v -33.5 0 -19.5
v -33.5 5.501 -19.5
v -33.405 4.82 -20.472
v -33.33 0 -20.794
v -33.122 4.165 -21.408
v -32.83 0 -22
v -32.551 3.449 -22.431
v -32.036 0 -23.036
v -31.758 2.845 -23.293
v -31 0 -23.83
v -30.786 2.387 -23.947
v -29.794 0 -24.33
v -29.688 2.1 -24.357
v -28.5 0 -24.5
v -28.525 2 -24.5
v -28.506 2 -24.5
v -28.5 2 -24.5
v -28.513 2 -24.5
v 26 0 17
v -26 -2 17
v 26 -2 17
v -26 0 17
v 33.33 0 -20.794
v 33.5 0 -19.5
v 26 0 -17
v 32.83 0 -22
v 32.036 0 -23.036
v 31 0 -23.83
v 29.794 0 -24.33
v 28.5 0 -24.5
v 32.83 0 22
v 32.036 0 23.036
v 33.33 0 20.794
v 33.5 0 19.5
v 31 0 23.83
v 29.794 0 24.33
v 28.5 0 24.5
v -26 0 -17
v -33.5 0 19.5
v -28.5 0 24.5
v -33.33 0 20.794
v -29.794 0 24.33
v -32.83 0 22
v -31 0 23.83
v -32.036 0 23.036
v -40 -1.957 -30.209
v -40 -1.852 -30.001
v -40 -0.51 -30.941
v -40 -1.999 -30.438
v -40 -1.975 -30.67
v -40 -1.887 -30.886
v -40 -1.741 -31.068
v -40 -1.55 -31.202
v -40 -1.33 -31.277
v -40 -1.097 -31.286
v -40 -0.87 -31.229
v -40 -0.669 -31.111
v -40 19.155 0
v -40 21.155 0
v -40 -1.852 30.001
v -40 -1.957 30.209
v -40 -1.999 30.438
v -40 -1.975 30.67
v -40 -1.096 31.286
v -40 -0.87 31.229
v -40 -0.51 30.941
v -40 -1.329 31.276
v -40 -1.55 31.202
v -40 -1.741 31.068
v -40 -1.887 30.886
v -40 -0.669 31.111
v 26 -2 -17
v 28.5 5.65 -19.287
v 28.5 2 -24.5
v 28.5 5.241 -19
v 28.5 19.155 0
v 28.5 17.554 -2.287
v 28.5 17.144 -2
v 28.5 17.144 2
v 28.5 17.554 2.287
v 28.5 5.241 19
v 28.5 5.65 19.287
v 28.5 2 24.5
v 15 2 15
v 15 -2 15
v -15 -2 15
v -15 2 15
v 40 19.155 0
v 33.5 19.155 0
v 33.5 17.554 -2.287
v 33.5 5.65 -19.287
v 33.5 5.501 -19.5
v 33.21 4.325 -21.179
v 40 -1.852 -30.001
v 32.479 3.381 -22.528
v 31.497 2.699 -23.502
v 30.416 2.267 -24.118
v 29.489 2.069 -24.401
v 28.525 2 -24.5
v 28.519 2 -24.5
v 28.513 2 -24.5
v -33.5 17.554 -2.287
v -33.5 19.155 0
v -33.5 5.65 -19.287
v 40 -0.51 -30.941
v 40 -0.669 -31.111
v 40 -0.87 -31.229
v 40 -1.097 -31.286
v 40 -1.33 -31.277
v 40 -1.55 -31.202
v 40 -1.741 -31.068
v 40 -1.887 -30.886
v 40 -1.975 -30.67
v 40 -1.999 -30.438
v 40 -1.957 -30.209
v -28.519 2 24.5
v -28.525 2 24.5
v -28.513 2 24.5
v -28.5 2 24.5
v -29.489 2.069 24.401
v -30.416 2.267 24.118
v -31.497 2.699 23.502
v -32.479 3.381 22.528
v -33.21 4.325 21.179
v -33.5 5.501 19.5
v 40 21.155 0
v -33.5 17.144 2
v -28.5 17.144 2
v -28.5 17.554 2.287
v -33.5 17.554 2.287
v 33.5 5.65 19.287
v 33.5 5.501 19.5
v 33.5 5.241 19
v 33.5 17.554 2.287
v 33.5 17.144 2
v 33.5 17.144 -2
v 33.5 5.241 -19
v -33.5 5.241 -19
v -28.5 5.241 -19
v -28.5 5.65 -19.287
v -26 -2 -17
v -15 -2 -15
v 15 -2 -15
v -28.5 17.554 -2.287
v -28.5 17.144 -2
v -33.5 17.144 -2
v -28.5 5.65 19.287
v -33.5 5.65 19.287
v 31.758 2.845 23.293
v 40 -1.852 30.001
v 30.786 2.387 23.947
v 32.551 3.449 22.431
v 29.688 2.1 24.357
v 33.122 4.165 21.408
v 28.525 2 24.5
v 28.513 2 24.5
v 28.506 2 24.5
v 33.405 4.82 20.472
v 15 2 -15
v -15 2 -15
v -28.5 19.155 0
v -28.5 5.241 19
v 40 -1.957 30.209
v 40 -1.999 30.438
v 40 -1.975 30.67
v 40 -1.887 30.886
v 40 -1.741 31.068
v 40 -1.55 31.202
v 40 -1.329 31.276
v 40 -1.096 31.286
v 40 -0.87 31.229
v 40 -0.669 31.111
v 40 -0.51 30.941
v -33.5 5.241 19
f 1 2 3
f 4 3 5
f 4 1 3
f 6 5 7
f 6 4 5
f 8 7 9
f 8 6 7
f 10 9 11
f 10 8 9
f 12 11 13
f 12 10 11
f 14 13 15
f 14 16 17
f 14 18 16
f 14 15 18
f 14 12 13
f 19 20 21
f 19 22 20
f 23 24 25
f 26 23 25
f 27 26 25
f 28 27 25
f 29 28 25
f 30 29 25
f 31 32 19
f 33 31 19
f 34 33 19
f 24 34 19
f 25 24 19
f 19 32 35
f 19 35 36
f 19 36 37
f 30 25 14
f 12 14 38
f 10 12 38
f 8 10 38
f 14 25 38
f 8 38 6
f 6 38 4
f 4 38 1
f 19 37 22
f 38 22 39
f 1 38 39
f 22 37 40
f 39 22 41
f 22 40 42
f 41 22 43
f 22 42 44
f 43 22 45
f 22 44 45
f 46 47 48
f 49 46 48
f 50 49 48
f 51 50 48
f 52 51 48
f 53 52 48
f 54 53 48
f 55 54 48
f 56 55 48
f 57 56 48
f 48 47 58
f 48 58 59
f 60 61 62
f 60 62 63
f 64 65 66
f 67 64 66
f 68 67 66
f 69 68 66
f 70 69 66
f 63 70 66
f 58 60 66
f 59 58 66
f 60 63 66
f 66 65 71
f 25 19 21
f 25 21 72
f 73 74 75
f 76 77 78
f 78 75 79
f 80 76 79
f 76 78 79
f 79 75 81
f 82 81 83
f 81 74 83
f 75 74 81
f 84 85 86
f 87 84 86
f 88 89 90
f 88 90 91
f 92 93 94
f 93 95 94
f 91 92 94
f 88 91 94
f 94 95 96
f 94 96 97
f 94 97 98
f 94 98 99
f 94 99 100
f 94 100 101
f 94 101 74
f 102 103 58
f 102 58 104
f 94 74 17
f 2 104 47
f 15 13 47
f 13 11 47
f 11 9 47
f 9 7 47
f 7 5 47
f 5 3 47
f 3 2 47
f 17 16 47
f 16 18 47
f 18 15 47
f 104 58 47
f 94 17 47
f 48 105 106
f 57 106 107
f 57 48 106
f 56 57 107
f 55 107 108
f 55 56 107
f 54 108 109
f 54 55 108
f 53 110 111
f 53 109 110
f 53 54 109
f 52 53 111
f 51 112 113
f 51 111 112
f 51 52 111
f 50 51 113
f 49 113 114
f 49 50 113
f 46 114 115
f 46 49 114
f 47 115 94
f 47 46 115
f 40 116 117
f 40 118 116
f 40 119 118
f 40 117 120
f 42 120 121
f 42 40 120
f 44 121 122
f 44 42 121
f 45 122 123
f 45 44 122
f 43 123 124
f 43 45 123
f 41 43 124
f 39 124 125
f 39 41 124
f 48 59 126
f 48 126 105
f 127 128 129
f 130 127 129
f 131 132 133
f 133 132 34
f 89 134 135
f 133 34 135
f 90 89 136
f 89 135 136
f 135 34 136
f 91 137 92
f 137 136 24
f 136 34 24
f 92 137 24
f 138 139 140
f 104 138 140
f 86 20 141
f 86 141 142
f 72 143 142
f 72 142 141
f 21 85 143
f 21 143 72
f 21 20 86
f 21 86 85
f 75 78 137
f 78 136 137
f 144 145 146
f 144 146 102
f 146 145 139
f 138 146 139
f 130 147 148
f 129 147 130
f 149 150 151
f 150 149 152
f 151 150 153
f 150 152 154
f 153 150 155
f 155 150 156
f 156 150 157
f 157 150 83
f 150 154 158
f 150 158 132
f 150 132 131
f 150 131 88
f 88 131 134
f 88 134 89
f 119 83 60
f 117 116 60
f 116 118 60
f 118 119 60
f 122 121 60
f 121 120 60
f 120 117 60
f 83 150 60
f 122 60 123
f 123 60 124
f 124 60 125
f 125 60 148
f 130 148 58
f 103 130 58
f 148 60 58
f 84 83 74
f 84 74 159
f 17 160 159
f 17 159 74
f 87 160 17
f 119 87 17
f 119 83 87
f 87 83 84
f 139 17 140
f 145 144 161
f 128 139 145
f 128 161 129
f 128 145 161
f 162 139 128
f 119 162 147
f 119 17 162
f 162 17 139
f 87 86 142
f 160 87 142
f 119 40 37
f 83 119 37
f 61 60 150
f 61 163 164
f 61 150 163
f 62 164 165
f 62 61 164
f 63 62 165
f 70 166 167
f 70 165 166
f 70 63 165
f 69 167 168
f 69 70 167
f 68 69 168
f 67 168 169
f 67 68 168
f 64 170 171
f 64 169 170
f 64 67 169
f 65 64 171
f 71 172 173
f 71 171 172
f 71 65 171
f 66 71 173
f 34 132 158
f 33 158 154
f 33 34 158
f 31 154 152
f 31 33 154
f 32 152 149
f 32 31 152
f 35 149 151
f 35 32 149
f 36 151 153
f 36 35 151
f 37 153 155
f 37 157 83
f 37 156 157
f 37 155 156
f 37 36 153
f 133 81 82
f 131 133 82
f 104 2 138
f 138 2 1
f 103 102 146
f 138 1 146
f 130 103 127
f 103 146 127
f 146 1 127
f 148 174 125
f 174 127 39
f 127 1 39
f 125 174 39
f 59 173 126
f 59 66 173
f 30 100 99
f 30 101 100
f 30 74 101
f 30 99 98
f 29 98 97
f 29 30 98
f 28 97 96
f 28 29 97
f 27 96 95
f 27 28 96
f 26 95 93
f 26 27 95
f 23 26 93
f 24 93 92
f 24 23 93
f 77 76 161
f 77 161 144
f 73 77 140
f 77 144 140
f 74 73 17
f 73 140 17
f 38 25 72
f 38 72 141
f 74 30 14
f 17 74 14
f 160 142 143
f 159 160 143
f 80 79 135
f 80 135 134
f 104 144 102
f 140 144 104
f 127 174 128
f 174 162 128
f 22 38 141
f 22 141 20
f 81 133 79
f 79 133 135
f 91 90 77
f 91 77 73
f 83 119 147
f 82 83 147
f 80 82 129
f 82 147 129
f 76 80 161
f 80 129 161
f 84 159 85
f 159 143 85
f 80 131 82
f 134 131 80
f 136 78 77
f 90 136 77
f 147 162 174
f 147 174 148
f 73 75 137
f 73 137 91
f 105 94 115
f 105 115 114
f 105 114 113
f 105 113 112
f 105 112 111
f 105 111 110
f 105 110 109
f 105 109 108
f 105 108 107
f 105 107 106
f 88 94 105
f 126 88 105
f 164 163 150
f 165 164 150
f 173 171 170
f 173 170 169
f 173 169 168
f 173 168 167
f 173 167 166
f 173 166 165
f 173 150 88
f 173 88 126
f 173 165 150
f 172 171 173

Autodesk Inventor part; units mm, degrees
ref_plane "YZ Plane" through (0, 0, 0) normal (1, 0, 0) x (0, 1, 0)
ref_plane "XZ Plane" through (0, 0, 0) normal (0, 1, 0) x (-1, 0, 0)
ref_plane "XY Plane" through (0, 0, 0) normal (0, 0, 1) x (1, 0, 0)
sketch "Skizze1" plane through (0, 0, 0) normal (0, 1, 0) x (-1, 0, 0)
  line L0 (28.5, 24.5) -> (-28.5, 24.5)
  line L1 (-33.5, 19.5) -> (-33.5, -19.5)
  line L2 (-28.5, -24.5) -> (28.5, -24.5)
  line L3 (33.5, -19.5) -> (33.5, 19.5)
  arc A0 (28.5, -24.5) -> (33.5, -19.5) centre (28.5, -19.5) ccw
  arc A1 (-33.5, -19.5) -> (-28.5, -24.5) centre (-28.5, -19.5) ccw
  arc A2 (-28.5, 24.5) -> (-33.5, 19.5) centre (-28.5, 19.5) ccw
  arc A3 (33.5, 19.5) -> (28.5, 24.5) centre (28.5, 19.5) ccw
  point P0 (0, 0)
  point P1 (-33.5, -24.5)
  point P2 (-33.5, 24.5)
  point P3 (33.5, -24.5)
  point P4 (-33.5, 0)
  point P5 (0, -24.5)
  dimension "d0" = 67
  dimension "d1" = 49
  dimension "d2" = 5
extrude "Extrusion1" add sketch "Skizze1" along normal blind 2
sketch "Skizze2" plane through (0, 0, 0) normal (1, 0, 0) x (0, 1, 0)
  line L0 (0, -19.5) -> (0, 19.5) projected
  line L1 (0, 19.5) -> (2, 19.5) projected
  line L2 (2, -19.5) -> (2, 19.5) projected
  line L3 (0, -19.5) -> (2, -19.5) projected
  line L4 (0, -24.5) -> (0, -19.5) projected
  line L5 (0, -19.5) -> (2, -19.5) projected
  line L6 (2, -24.5) -> (2, -19.5) projected
  line L7 (0, -24.5) -> (2, -24.5) projected
  line L8 (0, 19.5) -> (0, 24.5) projected
  line L9 (0, 24.5) -> (2, 24.5) projected
  line L10 (2, 19.5) -> (2, 24.5) projected
  line L11 (0, 19.5) -> (2, 19.5) projected
  line L12 (-1.8519, 30.001) -> (19.1551, 0)
  line L13 (19.1551, 0) -> (-1.8519, -30.001)
  line L14 (-0.5098, 30.9407) -> (21.1551, 0)
  line L15 (21.1551, 0) -> (-0.5098, -30.9407)
  arc A0 (-0.5098, 30.9407) -> (-1.8519, 30.001) centre (-1.1808, 30.4709) ccw
  arc A1 (-1.8519, -30.001) -> (-0.5098, -30.9407) centre (-1.1808, -30.4709) ccw
  line L16 (-2, 38.9986) -> (-2, -40.7887) construction
  point P0 (0, 0)
  point P1 (2, 0)
  dimension "d5" = 35
  dimension "d7" = 2
  dimension "d8" = 2
extrude "Extrusion2" add sketch "Skizze2" along normal mid plane 80 contours L13 L12 A0 L14 L15 A1
sketch "Skizze3" plane through (0, 2, 0) normal (0, 1, 0) x (1, 0, 0)
  arc A0 (28.5, -24.5) -> (33.5, -19.5) centre (28.5, -19.5) ccw projected
  line L0 (-28.5, -24.5) -> (28.5, -24.5) projected
  arc A1 (-33.5, -19.5) -> (-28.5, -24.5) centre (-28.5, -19.5) ccw projected
  line L1 (-33.5, 19.5) -> (-33.5, -19.5) projected
  arc A2 (-28.5, 24.5) -> (-33.5, 19.5) centre (-28.5, 19.5) ccw projected
  line L2 (28.5, 24.5) -> (-28.5, 24.5) projected
  arc A3 (33.5, 19.5) -> (28.5, 24.5) centre (28.5, 19.5) ccw projected
  line L3 (33.5, -19.5) -> (33.5, 19.5) projected
  arc A4 (-28.5, 24.5) -> (-33.5, 19.5) centre (-28.5, 19.5) ccw projected
  arc A5 (-33.5, -19.5) -> (-28.5, -24.5) centre (-28.5, -19.5) ccw projected
  line L4 (-28.5, 24.5) -> (-28.5, -24.5)
  line L5 (28.5, 24.5) -> (-28.5, 24.5) projected
  line L6 (-28.5, -24.5) -> (28.5, -24.5) projected
  line L7 (28.5, 24.5) -> (28.5, -24.5)
  point P0 (0, 0)
extrude "Extrusion3" add sketch "Skizze3" along normal up to next contours L7 A3 L3 A0 | A1 L1 A2 L4
sketch "Skizze4" plane through (0, 0, 0) normal (0, -1, 0) x (1, 0, 0)
  arc A0 (33.5, 19.5) -> (28.5, 24.5) centre (28.5, 19.5) ccw projected
  line L0 (-28.5, 24.5) -> (28.5, 24.5) projected
  arc A1 (-28.5, 24.5) -> (-33.5, 19.5) centre (-28.5, 19.5) ccw projected
  line L1 (-33.5, -19.5) -> (-33.5, 19.5) projected
  arc A2 (-33.5, -19.5) -> (-28.5, -24.5) centre (-28.5, -19.5) ccw projected
  line L2 (28.5, -24.5) -> (-28.5, -24.5) projected
  arc A3 (28.5, -24.5) -> (33.5, -19.5) centre (28.5, -19.5) ccw projected
  line L3 (33.5, 19.5) -> (33.5, -19.5) projected
  line L4 (-26, 17) -> (26, 17)
  line L5 (26, 17) -> (26, -17)
  line L6 (26, -17) -> (-26, -17)
  line L7 (-26, -17) -> (-26, 17)
  line L8 (-28.5, 24.5) -> (28.5, 24.5) projected
  point P0 (0, 0)
  point P1 (26, 0)
  point P2 (33.5, 0)
  point P3 (0, 17)
  point P4 (0, 24.5)
  dimension "d13" = 34
  dimension "d14" = 52
extrude "Extrusion4" add sketch "Skizze4" along normal blind 2 contours L4 L5 L6 L7
sketch "Skizze5" plane through (0, -2, 0) normal (0, -1, 0) x (1, 0, 0)
  line L0 (-15, -15) -> (15, -15)
  line L1 (15, -15) -> (15, 15)
  line L2 (15, 15) -> (-15, 15)
  line L3 (-15, 15) -> (-15, -15)
  point P0 (0, 0)
  point P1 (15, 0)
  point P2 (0, 15)
  dimension "d17" = 30
extrude "Extrusion5" cut sketch "Skizze5" against normal up to surface (4 mm away)
sketch "Skizze6" plane through (33.5, 0, 19.5) normal (1, 0, 0) x (0, 0, -1)
  line L0 (0, 0) -> (39, 0) projected
  line L1 (39, 0) -> (39, 5.501) projected
  line L2 (19.5, 19.1551) -> (39, 5.501) projected
  line L3 (0, 5.501) -> (19.5, 19.1551) projected
  line L4 (0, 0) -> (0, 5.501) projected
  line L5 (19.5, 18.5447) -> (38.5, 5.2408)
  line L6 (38.5, 5.2408) -> (38.5, 0.5)
  line L7 (38.5, 0.5) -> (0.5, 0.5)
  line L8 (0.5, 0.5) -> (0.5, 5.2408)
  line L9 (0.5, 5.2408) -> (19.5, 18.5447)
  line L10 (0.5, 5.2408) -> (0.2132, 5.6503)
  line L11 (0, 5.501) -> (19.5, 19.1551) projected
  line L12 (38.5, 5.2408) -> (38.7868, 5.6503)
  line L13 (19.5, 19.1551) -> (39, 5.501) projected
  line L14 (17.5, 17.1443) -> (17.2132, 17.5539)
  line L15 (21.5, 17.1443) -> (21.7868, 17.5539)
  point P0 (19.5, 0)
  dimension "d20" = 0.5
  dimension "d23" = 2
  dimension "d24" = 2
extrude "Extrusion6" cut sketch "Skizze6" against normal through all contours L3 L14 L9 L10 | L12 L5 L15 L2
equation "\"d24\" = d23"
properties part number "small_top"
